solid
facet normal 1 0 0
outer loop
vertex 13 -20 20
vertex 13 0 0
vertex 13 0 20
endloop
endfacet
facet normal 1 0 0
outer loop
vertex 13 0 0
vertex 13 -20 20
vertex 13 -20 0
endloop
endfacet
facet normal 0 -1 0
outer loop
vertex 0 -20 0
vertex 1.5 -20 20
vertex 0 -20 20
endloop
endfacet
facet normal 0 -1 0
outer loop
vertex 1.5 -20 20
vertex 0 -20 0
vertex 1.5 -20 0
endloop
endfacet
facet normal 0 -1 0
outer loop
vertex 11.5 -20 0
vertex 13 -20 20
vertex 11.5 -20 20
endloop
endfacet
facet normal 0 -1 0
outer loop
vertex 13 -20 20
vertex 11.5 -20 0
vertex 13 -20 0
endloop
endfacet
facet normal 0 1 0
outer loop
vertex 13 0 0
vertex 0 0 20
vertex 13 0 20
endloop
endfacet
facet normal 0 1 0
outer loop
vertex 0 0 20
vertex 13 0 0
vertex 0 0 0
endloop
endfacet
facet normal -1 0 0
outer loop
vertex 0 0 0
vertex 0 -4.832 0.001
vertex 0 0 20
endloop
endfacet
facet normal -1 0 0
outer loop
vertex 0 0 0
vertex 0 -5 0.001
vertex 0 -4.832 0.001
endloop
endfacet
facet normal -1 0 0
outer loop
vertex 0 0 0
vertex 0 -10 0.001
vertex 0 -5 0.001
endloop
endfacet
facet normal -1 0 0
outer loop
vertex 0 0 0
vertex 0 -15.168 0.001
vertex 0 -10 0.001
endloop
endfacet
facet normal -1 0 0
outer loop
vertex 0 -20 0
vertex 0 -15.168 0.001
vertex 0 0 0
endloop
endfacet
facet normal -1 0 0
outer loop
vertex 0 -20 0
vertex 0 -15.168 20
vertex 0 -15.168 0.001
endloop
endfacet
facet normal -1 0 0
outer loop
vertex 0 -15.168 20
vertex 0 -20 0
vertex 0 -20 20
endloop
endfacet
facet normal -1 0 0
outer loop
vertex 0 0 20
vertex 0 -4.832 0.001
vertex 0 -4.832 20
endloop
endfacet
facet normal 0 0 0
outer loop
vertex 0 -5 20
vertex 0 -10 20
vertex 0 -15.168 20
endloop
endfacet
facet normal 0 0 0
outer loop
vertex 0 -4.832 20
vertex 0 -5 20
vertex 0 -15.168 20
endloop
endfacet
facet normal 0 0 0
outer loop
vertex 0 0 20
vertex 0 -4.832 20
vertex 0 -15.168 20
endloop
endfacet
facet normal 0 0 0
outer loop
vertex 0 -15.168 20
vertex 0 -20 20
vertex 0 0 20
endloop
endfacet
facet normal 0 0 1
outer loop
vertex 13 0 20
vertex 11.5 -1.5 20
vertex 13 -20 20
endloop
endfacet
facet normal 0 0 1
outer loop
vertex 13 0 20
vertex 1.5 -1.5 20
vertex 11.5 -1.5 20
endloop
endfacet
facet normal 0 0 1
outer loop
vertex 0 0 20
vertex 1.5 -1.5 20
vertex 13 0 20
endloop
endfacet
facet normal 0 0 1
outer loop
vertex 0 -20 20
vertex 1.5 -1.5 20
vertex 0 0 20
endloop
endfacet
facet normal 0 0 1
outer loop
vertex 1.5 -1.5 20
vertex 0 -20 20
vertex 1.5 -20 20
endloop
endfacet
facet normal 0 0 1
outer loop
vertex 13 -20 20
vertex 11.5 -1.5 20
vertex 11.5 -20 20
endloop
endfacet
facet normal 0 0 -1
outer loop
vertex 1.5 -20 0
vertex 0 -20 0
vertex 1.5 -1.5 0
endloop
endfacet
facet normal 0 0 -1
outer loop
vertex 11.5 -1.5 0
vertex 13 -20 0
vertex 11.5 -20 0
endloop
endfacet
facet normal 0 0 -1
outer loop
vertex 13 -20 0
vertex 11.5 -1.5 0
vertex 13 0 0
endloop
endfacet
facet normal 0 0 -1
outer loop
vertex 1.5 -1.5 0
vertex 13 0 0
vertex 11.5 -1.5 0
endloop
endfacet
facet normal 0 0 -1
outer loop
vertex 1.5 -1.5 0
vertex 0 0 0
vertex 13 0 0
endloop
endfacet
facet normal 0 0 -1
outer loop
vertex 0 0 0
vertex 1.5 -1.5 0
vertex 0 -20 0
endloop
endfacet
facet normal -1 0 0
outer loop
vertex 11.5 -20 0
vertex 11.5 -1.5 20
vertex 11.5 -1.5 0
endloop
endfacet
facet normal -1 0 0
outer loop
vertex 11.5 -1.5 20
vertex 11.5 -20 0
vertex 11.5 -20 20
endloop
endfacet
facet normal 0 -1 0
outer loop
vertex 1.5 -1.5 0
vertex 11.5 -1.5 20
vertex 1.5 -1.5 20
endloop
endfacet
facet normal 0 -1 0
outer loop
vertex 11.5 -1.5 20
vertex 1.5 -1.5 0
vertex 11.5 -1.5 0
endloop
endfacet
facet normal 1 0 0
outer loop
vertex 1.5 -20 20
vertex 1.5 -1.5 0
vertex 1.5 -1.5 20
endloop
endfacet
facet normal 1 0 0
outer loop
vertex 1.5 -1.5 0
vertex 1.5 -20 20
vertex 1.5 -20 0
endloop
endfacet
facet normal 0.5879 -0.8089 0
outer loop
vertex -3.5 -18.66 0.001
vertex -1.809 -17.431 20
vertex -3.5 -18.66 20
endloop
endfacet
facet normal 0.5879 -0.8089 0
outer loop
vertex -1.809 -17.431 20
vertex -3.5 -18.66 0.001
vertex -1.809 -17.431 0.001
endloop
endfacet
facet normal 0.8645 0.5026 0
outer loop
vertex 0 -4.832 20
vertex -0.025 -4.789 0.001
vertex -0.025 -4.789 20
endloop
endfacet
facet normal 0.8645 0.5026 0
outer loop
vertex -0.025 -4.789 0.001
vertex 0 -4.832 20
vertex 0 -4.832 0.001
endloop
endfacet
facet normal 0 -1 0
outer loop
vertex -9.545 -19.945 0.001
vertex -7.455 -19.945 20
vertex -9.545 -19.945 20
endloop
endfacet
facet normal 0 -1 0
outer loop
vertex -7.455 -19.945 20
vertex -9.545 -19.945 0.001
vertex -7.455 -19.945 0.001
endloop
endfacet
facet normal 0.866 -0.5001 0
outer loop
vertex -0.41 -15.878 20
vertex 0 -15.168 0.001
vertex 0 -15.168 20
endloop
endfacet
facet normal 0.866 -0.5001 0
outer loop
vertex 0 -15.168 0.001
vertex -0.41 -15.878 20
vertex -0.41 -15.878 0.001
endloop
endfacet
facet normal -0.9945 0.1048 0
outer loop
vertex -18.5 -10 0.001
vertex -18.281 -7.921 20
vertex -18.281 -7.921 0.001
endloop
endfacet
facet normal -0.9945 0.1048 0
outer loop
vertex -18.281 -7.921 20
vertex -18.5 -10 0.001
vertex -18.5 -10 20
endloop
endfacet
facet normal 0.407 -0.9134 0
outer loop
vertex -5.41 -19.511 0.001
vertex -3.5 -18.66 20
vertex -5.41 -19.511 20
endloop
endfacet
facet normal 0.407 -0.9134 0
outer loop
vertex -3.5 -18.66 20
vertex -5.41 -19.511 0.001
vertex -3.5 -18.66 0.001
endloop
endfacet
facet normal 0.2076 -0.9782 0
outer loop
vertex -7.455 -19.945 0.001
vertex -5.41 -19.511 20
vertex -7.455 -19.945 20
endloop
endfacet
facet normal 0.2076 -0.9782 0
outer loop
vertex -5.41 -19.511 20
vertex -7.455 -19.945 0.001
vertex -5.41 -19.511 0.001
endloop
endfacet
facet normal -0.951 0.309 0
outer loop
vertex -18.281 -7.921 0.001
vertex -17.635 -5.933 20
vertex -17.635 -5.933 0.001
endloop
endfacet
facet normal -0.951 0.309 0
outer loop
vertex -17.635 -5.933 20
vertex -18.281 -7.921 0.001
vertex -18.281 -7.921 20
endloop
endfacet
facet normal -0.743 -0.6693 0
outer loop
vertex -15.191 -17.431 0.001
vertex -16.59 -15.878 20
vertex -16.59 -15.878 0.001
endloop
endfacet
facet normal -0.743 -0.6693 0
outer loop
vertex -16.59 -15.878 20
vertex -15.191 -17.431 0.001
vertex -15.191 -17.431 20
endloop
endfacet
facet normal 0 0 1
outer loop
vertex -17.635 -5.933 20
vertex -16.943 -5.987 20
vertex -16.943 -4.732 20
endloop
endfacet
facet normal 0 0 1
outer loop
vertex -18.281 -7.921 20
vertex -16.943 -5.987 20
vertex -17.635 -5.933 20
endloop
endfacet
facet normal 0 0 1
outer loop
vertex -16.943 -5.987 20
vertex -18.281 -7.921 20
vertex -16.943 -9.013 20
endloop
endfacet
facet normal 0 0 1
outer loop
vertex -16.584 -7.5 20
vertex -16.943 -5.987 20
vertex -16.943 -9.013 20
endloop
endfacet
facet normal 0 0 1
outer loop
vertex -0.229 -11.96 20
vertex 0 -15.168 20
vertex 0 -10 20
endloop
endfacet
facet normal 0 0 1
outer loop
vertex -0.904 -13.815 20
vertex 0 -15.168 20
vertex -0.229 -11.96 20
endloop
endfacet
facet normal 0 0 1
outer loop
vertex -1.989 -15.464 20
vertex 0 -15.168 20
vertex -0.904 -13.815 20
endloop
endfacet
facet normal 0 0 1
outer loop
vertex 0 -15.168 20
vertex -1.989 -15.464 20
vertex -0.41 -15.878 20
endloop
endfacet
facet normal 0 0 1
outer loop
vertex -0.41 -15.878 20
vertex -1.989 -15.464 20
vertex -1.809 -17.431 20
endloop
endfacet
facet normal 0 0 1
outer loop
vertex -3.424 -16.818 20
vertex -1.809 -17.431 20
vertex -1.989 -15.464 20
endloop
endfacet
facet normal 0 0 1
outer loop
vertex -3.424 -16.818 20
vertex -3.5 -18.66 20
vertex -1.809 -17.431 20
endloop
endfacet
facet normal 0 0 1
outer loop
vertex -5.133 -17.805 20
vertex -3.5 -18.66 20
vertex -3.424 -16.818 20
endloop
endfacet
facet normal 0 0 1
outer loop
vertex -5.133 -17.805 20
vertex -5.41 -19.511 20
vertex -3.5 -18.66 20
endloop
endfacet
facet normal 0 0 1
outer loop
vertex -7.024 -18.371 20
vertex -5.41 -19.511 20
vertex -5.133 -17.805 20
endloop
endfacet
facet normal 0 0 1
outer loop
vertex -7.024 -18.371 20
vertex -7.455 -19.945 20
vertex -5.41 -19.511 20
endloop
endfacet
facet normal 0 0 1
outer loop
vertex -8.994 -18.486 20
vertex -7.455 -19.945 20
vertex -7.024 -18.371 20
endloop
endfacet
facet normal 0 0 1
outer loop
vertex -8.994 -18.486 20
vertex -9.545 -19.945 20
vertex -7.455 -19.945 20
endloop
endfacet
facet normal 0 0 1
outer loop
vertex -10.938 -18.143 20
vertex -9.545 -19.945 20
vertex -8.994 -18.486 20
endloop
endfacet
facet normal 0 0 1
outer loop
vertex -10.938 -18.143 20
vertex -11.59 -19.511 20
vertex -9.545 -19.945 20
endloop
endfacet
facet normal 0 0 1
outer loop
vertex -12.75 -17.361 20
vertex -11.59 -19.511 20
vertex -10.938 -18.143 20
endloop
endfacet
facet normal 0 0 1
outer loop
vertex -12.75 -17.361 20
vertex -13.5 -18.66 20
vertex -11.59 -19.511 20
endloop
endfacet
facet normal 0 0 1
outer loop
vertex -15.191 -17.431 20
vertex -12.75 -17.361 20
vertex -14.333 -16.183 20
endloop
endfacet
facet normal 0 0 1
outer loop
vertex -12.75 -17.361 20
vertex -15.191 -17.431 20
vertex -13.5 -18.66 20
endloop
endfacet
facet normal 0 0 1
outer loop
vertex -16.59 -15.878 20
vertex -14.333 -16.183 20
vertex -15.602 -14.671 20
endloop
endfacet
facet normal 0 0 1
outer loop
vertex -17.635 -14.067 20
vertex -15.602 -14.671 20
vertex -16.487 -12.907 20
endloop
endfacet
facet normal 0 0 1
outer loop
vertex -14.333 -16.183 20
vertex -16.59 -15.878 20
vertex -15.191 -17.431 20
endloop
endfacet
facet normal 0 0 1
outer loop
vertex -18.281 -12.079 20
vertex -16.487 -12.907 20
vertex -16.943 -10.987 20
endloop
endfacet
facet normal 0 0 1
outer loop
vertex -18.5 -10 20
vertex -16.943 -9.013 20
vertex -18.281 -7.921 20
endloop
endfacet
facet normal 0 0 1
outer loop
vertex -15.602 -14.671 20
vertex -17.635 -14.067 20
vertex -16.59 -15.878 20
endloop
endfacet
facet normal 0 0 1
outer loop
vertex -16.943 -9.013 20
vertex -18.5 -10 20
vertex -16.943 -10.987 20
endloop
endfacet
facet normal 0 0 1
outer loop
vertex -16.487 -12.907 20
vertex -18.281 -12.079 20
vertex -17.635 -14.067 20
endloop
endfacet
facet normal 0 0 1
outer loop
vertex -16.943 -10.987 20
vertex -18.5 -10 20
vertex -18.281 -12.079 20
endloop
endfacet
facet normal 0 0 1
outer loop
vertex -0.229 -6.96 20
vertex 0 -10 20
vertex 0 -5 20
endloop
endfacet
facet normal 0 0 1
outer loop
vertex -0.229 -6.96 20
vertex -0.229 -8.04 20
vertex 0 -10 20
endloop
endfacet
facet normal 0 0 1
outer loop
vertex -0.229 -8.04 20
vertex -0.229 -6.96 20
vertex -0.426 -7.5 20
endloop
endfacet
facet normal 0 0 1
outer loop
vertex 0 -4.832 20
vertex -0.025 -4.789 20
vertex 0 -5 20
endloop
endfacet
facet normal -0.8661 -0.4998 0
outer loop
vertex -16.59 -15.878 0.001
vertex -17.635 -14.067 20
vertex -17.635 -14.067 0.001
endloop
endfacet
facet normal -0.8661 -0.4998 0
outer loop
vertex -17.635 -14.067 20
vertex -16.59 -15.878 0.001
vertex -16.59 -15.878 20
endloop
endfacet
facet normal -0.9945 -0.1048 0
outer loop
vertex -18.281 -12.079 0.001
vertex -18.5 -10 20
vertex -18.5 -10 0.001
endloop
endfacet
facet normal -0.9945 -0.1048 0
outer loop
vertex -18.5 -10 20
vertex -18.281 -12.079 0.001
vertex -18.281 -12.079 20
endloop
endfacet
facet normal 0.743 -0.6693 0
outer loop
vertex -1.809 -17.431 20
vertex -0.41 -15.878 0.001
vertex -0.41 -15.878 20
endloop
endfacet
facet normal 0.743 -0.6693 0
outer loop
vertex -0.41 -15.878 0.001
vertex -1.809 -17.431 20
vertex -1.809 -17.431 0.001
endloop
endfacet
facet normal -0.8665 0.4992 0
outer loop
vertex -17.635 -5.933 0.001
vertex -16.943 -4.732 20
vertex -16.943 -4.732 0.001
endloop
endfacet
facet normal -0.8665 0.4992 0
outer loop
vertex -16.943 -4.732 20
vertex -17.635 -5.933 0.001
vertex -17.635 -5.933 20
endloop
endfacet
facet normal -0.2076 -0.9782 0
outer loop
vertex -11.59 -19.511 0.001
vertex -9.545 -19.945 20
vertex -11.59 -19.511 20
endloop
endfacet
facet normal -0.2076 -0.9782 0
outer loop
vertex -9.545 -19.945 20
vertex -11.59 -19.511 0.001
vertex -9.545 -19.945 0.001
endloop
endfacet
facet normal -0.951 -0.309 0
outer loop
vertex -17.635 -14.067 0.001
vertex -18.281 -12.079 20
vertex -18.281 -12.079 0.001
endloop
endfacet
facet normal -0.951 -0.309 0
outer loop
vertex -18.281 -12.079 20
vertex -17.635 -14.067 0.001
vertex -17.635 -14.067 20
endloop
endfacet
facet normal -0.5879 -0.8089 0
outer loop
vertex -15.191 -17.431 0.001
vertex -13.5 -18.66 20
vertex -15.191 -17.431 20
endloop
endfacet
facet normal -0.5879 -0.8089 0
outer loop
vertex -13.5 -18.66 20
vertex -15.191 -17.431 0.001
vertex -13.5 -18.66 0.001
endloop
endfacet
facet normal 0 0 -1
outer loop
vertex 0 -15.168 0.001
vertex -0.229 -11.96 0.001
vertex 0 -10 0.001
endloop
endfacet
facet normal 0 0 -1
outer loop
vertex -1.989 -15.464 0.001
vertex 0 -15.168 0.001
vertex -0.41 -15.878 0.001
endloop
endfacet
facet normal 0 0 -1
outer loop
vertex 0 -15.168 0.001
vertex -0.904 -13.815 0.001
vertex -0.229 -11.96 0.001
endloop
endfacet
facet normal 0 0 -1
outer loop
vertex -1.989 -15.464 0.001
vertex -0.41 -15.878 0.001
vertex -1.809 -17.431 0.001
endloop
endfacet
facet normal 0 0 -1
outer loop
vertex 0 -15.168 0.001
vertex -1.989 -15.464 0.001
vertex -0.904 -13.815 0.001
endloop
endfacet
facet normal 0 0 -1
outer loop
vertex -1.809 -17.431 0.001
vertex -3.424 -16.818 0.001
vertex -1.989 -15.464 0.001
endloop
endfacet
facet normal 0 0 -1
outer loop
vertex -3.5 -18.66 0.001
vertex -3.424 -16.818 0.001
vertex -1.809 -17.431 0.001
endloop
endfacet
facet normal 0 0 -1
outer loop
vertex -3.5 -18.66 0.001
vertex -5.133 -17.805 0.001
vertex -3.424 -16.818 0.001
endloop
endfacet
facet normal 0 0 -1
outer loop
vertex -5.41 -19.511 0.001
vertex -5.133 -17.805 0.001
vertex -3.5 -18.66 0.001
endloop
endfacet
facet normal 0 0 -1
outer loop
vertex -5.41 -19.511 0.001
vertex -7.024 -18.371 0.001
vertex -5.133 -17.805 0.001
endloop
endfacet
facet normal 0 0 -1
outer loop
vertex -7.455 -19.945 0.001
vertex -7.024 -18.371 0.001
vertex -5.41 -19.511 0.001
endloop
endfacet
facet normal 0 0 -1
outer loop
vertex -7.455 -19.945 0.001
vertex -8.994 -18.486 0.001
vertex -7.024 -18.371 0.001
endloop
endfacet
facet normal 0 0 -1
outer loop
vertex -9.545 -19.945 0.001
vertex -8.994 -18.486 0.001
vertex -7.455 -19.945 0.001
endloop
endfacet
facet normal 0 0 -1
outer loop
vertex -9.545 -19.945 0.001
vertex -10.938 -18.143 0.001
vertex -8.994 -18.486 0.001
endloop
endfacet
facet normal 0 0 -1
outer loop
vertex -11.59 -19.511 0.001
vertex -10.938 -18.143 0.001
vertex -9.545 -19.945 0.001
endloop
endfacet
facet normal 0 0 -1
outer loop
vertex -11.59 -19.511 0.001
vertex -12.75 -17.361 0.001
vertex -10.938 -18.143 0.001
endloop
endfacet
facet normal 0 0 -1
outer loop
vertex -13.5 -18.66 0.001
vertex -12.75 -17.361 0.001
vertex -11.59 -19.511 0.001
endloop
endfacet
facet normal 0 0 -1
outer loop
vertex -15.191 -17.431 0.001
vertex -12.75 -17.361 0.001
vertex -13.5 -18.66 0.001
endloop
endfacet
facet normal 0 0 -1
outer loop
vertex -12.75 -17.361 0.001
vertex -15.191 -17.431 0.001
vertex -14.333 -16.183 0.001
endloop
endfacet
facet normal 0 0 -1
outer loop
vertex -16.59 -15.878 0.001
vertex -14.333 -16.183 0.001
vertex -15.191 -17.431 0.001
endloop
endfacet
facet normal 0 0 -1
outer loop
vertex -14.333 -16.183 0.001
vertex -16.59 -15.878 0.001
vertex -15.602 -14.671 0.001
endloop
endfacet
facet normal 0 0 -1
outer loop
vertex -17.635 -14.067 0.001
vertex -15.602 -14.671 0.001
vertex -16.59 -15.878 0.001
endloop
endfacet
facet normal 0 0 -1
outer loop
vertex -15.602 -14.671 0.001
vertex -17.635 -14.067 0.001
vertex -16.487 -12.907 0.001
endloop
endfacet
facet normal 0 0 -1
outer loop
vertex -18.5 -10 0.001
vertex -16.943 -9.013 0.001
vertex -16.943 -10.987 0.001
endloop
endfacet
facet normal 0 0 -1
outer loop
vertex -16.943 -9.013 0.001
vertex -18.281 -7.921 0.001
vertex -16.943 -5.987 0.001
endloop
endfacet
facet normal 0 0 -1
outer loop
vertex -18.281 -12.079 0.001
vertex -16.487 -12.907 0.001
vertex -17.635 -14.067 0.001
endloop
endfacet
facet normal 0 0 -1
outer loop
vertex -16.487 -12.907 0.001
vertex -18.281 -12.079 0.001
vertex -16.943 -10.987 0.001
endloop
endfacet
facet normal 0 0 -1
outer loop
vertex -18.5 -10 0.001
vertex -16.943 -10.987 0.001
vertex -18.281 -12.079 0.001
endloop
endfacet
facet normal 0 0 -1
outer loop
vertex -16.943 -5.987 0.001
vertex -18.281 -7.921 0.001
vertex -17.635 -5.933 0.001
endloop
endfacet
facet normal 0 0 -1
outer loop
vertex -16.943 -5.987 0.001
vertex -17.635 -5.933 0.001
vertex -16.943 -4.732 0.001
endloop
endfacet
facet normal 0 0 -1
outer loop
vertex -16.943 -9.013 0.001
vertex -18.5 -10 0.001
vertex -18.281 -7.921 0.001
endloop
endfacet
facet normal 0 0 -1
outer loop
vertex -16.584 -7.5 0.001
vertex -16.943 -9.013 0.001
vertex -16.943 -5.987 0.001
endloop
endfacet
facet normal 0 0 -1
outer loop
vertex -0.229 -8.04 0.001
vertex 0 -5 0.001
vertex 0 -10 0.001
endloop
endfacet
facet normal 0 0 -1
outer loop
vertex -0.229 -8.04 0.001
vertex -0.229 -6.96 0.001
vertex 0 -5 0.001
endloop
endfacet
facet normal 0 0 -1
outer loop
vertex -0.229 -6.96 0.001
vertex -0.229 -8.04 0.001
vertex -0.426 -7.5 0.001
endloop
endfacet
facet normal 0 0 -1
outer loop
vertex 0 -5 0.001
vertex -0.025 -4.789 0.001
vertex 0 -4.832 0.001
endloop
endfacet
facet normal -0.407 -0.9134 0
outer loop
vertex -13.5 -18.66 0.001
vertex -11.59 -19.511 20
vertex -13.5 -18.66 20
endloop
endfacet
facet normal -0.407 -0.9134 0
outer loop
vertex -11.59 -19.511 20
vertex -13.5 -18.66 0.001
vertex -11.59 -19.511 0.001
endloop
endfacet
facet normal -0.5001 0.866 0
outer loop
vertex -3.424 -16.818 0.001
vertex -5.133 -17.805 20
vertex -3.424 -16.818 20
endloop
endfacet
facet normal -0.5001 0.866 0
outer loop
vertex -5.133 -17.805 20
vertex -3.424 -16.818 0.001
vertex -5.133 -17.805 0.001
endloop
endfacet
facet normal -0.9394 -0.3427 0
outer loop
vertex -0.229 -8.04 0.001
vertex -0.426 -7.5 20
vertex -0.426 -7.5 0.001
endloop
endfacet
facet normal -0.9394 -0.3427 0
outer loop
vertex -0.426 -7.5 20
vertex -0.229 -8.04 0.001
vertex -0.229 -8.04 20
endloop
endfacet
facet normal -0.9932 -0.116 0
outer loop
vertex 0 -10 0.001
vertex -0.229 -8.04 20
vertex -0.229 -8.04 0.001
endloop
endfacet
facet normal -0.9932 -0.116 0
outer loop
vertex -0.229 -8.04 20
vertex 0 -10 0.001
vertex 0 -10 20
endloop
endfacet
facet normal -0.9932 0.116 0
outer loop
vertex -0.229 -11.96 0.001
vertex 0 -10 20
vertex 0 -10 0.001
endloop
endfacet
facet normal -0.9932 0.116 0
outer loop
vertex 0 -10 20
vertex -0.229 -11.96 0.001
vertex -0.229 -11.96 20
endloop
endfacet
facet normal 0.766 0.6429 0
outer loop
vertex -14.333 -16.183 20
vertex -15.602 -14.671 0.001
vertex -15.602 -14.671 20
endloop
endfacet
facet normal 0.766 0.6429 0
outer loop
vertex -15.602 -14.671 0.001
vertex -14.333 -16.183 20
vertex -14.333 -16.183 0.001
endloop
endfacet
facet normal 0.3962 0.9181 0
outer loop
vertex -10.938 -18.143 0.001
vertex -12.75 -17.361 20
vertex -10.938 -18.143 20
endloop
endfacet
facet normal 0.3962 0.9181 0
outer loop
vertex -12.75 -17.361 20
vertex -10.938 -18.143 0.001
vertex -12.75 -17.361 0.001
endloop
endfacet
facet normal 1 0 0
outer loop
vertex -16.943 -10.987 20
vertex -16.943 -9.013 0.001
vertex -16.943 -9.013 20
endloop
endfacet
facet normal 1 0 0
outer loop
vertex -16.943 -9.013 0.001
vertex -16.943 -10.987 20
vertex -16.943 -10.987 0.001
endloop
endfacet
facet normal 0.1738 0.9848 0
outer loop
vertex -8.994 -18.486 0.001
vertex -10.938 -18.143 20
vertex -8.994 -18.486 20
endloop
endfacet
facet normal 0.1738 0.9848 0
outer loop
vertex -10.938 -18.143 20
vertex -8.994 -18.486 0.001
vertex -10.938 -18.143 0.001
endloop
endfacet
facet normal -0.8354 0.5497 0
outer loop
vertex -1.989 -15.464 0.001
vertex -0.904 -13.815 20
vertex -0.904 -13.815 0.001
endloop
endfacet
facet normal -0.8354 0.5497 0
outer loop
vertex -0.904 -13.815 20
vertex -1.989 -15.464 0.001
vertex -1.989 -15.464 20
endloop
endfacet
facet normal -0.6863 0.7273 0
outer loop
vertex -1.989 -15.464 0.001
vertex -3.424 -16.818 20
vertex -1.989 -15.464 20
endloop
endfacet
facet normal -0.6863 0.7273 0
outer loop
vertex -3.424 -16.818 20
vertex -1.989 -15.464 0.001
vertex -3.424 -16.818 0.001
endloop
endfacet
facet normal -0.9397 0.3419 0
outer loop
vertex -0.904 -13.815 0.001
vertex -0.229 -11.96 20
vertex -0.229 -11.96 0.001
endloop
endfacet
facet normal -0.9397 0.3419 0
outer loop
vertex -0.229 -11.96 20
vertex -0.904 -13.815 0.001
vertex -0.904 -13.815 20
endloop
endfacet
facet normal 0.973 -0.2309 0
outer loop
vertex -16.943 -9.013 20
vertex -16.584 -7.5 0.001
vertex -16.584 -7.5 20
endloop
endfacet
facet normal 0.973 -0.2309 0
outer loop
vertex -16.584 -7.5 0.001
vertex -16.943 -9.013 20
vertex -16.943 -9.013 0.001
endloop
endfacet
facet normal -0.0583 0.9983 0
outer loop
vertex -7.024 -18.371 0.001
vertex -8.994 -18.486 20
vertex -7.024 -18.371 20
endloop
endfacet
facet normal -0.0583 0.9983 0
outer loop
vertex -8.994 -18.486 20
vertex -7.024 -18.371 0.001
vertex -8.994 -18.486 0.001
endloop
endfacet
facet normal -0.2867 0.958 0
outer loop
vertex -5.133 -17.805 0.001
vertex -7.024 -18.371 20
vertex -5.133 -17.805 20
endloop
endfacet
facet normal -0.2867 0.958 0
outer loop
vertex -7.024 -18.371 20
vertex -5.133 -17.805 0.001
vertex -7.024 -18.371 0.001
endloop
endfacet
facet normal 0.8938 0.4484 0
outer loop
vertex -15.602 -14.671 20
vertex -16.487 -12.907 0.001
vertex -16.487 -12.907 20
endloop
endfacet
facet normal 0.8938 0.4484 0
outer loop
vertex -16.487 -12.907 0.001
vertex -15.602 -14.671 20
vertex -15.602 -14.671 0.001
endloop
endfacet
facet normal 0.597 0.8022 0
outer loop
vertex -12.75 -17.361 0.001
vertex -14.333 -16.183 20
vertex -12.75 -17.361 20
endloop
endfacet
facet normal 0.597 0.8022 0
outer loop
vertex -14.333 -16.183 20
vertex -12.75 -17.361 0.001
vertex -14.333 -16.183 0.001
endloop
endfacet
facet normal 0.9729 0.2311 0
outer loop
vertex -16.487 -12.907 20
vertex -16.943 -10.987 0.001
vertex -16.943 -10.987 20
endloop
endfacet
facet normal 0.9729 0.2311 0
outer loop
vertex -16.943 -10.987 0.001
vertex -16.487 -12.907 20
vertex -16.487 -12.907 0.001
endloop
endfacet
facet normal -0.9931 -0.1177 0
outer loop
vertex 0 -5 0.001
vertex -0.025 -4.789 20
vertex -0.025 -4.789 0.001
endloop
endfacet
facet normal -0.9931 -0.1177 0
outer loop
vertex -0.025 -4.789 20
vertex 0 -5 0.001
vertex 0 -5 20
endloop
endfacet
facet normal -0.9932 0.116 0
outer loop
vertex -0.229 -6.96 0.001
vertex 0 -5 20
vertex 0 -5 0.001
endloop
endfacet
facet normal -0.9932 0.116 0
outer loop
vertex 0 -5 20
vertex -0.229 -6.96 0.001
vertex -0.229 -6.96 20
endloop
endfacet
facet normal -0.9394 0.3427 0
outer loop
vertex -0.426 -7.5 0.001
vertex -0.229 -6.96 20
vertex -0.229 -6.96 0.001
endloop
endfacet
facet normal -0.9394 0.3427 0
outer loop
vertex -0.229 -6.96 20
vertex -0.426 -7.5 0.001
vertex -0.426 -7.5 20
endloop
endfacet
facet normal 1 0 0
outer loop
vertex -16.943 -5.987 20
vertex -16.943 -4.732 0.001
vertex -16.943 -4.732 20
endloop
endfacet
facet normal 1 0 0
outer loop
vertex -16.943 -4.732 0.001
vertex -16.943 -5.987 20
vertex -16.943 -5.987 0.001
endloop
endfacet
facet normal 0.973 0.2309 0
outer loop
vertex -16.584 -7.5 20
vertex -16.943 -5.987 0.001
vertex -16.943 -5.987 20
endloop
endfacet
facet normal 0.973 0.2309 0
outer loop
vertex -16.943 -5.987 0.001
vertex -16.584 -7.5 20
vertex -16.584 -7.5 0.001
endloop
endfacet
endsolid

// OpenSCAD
// [FL_INDEX: keywords="openscad, 3d_parametric, Markerboard_Clip, csg_solid" | COT="Parametric OpenSCAD design from 3DCodeverse"]
// Title: Markerboard Clip

// The thickness of your marker board
BOARD_THICKNESS=10; //[1:100]

// The radius of your marker
MARKER_RADIUS=10; //[1:100]

// The thickness of the resulting clip
CLIP_THICKNESS=1.5; //[1:10]

// How wide the clip will be
CLIP_WIDTH=20; // [1:100]

// preview[view:south east, tilt:top]

rotate([90, 0, 0]) {
	difference() {
		cube(size=[BOARD_THICKNESS+CLIP_THICKNESS*2, CLIP_WIDTH, MARKER_RADIUS*2]);
		translate([CLIP_THICKNESS, -1, CLIP_THICKNESS]) cube(size=[BOARD_THICKNESS, CLIP_WIDTH+3, MARKER_RADIUS*3]);
	}
	translate([-BOARD_THICKNESS+CLIP_THICKNESS, 0.001, MARKER_RADIUS]) {
		rotate([270, 0, 0]) difference() {
			cylinder(r=MARKER_RADIUS, h=CLIP_WIDTH-0.001);
			translate([0, 0, -1]) cylinder(r=MARKER_RADIUS-CLIP_THICKNESS, h=CLIP_WIDTH+3);
			translate([0, MARKER_RADIUS/2, -1]) cylinder(r=MARKER_RADIUS-CLIP_THICKNESS, h=CLIP_WIDTH+3);
		}
	}
}
